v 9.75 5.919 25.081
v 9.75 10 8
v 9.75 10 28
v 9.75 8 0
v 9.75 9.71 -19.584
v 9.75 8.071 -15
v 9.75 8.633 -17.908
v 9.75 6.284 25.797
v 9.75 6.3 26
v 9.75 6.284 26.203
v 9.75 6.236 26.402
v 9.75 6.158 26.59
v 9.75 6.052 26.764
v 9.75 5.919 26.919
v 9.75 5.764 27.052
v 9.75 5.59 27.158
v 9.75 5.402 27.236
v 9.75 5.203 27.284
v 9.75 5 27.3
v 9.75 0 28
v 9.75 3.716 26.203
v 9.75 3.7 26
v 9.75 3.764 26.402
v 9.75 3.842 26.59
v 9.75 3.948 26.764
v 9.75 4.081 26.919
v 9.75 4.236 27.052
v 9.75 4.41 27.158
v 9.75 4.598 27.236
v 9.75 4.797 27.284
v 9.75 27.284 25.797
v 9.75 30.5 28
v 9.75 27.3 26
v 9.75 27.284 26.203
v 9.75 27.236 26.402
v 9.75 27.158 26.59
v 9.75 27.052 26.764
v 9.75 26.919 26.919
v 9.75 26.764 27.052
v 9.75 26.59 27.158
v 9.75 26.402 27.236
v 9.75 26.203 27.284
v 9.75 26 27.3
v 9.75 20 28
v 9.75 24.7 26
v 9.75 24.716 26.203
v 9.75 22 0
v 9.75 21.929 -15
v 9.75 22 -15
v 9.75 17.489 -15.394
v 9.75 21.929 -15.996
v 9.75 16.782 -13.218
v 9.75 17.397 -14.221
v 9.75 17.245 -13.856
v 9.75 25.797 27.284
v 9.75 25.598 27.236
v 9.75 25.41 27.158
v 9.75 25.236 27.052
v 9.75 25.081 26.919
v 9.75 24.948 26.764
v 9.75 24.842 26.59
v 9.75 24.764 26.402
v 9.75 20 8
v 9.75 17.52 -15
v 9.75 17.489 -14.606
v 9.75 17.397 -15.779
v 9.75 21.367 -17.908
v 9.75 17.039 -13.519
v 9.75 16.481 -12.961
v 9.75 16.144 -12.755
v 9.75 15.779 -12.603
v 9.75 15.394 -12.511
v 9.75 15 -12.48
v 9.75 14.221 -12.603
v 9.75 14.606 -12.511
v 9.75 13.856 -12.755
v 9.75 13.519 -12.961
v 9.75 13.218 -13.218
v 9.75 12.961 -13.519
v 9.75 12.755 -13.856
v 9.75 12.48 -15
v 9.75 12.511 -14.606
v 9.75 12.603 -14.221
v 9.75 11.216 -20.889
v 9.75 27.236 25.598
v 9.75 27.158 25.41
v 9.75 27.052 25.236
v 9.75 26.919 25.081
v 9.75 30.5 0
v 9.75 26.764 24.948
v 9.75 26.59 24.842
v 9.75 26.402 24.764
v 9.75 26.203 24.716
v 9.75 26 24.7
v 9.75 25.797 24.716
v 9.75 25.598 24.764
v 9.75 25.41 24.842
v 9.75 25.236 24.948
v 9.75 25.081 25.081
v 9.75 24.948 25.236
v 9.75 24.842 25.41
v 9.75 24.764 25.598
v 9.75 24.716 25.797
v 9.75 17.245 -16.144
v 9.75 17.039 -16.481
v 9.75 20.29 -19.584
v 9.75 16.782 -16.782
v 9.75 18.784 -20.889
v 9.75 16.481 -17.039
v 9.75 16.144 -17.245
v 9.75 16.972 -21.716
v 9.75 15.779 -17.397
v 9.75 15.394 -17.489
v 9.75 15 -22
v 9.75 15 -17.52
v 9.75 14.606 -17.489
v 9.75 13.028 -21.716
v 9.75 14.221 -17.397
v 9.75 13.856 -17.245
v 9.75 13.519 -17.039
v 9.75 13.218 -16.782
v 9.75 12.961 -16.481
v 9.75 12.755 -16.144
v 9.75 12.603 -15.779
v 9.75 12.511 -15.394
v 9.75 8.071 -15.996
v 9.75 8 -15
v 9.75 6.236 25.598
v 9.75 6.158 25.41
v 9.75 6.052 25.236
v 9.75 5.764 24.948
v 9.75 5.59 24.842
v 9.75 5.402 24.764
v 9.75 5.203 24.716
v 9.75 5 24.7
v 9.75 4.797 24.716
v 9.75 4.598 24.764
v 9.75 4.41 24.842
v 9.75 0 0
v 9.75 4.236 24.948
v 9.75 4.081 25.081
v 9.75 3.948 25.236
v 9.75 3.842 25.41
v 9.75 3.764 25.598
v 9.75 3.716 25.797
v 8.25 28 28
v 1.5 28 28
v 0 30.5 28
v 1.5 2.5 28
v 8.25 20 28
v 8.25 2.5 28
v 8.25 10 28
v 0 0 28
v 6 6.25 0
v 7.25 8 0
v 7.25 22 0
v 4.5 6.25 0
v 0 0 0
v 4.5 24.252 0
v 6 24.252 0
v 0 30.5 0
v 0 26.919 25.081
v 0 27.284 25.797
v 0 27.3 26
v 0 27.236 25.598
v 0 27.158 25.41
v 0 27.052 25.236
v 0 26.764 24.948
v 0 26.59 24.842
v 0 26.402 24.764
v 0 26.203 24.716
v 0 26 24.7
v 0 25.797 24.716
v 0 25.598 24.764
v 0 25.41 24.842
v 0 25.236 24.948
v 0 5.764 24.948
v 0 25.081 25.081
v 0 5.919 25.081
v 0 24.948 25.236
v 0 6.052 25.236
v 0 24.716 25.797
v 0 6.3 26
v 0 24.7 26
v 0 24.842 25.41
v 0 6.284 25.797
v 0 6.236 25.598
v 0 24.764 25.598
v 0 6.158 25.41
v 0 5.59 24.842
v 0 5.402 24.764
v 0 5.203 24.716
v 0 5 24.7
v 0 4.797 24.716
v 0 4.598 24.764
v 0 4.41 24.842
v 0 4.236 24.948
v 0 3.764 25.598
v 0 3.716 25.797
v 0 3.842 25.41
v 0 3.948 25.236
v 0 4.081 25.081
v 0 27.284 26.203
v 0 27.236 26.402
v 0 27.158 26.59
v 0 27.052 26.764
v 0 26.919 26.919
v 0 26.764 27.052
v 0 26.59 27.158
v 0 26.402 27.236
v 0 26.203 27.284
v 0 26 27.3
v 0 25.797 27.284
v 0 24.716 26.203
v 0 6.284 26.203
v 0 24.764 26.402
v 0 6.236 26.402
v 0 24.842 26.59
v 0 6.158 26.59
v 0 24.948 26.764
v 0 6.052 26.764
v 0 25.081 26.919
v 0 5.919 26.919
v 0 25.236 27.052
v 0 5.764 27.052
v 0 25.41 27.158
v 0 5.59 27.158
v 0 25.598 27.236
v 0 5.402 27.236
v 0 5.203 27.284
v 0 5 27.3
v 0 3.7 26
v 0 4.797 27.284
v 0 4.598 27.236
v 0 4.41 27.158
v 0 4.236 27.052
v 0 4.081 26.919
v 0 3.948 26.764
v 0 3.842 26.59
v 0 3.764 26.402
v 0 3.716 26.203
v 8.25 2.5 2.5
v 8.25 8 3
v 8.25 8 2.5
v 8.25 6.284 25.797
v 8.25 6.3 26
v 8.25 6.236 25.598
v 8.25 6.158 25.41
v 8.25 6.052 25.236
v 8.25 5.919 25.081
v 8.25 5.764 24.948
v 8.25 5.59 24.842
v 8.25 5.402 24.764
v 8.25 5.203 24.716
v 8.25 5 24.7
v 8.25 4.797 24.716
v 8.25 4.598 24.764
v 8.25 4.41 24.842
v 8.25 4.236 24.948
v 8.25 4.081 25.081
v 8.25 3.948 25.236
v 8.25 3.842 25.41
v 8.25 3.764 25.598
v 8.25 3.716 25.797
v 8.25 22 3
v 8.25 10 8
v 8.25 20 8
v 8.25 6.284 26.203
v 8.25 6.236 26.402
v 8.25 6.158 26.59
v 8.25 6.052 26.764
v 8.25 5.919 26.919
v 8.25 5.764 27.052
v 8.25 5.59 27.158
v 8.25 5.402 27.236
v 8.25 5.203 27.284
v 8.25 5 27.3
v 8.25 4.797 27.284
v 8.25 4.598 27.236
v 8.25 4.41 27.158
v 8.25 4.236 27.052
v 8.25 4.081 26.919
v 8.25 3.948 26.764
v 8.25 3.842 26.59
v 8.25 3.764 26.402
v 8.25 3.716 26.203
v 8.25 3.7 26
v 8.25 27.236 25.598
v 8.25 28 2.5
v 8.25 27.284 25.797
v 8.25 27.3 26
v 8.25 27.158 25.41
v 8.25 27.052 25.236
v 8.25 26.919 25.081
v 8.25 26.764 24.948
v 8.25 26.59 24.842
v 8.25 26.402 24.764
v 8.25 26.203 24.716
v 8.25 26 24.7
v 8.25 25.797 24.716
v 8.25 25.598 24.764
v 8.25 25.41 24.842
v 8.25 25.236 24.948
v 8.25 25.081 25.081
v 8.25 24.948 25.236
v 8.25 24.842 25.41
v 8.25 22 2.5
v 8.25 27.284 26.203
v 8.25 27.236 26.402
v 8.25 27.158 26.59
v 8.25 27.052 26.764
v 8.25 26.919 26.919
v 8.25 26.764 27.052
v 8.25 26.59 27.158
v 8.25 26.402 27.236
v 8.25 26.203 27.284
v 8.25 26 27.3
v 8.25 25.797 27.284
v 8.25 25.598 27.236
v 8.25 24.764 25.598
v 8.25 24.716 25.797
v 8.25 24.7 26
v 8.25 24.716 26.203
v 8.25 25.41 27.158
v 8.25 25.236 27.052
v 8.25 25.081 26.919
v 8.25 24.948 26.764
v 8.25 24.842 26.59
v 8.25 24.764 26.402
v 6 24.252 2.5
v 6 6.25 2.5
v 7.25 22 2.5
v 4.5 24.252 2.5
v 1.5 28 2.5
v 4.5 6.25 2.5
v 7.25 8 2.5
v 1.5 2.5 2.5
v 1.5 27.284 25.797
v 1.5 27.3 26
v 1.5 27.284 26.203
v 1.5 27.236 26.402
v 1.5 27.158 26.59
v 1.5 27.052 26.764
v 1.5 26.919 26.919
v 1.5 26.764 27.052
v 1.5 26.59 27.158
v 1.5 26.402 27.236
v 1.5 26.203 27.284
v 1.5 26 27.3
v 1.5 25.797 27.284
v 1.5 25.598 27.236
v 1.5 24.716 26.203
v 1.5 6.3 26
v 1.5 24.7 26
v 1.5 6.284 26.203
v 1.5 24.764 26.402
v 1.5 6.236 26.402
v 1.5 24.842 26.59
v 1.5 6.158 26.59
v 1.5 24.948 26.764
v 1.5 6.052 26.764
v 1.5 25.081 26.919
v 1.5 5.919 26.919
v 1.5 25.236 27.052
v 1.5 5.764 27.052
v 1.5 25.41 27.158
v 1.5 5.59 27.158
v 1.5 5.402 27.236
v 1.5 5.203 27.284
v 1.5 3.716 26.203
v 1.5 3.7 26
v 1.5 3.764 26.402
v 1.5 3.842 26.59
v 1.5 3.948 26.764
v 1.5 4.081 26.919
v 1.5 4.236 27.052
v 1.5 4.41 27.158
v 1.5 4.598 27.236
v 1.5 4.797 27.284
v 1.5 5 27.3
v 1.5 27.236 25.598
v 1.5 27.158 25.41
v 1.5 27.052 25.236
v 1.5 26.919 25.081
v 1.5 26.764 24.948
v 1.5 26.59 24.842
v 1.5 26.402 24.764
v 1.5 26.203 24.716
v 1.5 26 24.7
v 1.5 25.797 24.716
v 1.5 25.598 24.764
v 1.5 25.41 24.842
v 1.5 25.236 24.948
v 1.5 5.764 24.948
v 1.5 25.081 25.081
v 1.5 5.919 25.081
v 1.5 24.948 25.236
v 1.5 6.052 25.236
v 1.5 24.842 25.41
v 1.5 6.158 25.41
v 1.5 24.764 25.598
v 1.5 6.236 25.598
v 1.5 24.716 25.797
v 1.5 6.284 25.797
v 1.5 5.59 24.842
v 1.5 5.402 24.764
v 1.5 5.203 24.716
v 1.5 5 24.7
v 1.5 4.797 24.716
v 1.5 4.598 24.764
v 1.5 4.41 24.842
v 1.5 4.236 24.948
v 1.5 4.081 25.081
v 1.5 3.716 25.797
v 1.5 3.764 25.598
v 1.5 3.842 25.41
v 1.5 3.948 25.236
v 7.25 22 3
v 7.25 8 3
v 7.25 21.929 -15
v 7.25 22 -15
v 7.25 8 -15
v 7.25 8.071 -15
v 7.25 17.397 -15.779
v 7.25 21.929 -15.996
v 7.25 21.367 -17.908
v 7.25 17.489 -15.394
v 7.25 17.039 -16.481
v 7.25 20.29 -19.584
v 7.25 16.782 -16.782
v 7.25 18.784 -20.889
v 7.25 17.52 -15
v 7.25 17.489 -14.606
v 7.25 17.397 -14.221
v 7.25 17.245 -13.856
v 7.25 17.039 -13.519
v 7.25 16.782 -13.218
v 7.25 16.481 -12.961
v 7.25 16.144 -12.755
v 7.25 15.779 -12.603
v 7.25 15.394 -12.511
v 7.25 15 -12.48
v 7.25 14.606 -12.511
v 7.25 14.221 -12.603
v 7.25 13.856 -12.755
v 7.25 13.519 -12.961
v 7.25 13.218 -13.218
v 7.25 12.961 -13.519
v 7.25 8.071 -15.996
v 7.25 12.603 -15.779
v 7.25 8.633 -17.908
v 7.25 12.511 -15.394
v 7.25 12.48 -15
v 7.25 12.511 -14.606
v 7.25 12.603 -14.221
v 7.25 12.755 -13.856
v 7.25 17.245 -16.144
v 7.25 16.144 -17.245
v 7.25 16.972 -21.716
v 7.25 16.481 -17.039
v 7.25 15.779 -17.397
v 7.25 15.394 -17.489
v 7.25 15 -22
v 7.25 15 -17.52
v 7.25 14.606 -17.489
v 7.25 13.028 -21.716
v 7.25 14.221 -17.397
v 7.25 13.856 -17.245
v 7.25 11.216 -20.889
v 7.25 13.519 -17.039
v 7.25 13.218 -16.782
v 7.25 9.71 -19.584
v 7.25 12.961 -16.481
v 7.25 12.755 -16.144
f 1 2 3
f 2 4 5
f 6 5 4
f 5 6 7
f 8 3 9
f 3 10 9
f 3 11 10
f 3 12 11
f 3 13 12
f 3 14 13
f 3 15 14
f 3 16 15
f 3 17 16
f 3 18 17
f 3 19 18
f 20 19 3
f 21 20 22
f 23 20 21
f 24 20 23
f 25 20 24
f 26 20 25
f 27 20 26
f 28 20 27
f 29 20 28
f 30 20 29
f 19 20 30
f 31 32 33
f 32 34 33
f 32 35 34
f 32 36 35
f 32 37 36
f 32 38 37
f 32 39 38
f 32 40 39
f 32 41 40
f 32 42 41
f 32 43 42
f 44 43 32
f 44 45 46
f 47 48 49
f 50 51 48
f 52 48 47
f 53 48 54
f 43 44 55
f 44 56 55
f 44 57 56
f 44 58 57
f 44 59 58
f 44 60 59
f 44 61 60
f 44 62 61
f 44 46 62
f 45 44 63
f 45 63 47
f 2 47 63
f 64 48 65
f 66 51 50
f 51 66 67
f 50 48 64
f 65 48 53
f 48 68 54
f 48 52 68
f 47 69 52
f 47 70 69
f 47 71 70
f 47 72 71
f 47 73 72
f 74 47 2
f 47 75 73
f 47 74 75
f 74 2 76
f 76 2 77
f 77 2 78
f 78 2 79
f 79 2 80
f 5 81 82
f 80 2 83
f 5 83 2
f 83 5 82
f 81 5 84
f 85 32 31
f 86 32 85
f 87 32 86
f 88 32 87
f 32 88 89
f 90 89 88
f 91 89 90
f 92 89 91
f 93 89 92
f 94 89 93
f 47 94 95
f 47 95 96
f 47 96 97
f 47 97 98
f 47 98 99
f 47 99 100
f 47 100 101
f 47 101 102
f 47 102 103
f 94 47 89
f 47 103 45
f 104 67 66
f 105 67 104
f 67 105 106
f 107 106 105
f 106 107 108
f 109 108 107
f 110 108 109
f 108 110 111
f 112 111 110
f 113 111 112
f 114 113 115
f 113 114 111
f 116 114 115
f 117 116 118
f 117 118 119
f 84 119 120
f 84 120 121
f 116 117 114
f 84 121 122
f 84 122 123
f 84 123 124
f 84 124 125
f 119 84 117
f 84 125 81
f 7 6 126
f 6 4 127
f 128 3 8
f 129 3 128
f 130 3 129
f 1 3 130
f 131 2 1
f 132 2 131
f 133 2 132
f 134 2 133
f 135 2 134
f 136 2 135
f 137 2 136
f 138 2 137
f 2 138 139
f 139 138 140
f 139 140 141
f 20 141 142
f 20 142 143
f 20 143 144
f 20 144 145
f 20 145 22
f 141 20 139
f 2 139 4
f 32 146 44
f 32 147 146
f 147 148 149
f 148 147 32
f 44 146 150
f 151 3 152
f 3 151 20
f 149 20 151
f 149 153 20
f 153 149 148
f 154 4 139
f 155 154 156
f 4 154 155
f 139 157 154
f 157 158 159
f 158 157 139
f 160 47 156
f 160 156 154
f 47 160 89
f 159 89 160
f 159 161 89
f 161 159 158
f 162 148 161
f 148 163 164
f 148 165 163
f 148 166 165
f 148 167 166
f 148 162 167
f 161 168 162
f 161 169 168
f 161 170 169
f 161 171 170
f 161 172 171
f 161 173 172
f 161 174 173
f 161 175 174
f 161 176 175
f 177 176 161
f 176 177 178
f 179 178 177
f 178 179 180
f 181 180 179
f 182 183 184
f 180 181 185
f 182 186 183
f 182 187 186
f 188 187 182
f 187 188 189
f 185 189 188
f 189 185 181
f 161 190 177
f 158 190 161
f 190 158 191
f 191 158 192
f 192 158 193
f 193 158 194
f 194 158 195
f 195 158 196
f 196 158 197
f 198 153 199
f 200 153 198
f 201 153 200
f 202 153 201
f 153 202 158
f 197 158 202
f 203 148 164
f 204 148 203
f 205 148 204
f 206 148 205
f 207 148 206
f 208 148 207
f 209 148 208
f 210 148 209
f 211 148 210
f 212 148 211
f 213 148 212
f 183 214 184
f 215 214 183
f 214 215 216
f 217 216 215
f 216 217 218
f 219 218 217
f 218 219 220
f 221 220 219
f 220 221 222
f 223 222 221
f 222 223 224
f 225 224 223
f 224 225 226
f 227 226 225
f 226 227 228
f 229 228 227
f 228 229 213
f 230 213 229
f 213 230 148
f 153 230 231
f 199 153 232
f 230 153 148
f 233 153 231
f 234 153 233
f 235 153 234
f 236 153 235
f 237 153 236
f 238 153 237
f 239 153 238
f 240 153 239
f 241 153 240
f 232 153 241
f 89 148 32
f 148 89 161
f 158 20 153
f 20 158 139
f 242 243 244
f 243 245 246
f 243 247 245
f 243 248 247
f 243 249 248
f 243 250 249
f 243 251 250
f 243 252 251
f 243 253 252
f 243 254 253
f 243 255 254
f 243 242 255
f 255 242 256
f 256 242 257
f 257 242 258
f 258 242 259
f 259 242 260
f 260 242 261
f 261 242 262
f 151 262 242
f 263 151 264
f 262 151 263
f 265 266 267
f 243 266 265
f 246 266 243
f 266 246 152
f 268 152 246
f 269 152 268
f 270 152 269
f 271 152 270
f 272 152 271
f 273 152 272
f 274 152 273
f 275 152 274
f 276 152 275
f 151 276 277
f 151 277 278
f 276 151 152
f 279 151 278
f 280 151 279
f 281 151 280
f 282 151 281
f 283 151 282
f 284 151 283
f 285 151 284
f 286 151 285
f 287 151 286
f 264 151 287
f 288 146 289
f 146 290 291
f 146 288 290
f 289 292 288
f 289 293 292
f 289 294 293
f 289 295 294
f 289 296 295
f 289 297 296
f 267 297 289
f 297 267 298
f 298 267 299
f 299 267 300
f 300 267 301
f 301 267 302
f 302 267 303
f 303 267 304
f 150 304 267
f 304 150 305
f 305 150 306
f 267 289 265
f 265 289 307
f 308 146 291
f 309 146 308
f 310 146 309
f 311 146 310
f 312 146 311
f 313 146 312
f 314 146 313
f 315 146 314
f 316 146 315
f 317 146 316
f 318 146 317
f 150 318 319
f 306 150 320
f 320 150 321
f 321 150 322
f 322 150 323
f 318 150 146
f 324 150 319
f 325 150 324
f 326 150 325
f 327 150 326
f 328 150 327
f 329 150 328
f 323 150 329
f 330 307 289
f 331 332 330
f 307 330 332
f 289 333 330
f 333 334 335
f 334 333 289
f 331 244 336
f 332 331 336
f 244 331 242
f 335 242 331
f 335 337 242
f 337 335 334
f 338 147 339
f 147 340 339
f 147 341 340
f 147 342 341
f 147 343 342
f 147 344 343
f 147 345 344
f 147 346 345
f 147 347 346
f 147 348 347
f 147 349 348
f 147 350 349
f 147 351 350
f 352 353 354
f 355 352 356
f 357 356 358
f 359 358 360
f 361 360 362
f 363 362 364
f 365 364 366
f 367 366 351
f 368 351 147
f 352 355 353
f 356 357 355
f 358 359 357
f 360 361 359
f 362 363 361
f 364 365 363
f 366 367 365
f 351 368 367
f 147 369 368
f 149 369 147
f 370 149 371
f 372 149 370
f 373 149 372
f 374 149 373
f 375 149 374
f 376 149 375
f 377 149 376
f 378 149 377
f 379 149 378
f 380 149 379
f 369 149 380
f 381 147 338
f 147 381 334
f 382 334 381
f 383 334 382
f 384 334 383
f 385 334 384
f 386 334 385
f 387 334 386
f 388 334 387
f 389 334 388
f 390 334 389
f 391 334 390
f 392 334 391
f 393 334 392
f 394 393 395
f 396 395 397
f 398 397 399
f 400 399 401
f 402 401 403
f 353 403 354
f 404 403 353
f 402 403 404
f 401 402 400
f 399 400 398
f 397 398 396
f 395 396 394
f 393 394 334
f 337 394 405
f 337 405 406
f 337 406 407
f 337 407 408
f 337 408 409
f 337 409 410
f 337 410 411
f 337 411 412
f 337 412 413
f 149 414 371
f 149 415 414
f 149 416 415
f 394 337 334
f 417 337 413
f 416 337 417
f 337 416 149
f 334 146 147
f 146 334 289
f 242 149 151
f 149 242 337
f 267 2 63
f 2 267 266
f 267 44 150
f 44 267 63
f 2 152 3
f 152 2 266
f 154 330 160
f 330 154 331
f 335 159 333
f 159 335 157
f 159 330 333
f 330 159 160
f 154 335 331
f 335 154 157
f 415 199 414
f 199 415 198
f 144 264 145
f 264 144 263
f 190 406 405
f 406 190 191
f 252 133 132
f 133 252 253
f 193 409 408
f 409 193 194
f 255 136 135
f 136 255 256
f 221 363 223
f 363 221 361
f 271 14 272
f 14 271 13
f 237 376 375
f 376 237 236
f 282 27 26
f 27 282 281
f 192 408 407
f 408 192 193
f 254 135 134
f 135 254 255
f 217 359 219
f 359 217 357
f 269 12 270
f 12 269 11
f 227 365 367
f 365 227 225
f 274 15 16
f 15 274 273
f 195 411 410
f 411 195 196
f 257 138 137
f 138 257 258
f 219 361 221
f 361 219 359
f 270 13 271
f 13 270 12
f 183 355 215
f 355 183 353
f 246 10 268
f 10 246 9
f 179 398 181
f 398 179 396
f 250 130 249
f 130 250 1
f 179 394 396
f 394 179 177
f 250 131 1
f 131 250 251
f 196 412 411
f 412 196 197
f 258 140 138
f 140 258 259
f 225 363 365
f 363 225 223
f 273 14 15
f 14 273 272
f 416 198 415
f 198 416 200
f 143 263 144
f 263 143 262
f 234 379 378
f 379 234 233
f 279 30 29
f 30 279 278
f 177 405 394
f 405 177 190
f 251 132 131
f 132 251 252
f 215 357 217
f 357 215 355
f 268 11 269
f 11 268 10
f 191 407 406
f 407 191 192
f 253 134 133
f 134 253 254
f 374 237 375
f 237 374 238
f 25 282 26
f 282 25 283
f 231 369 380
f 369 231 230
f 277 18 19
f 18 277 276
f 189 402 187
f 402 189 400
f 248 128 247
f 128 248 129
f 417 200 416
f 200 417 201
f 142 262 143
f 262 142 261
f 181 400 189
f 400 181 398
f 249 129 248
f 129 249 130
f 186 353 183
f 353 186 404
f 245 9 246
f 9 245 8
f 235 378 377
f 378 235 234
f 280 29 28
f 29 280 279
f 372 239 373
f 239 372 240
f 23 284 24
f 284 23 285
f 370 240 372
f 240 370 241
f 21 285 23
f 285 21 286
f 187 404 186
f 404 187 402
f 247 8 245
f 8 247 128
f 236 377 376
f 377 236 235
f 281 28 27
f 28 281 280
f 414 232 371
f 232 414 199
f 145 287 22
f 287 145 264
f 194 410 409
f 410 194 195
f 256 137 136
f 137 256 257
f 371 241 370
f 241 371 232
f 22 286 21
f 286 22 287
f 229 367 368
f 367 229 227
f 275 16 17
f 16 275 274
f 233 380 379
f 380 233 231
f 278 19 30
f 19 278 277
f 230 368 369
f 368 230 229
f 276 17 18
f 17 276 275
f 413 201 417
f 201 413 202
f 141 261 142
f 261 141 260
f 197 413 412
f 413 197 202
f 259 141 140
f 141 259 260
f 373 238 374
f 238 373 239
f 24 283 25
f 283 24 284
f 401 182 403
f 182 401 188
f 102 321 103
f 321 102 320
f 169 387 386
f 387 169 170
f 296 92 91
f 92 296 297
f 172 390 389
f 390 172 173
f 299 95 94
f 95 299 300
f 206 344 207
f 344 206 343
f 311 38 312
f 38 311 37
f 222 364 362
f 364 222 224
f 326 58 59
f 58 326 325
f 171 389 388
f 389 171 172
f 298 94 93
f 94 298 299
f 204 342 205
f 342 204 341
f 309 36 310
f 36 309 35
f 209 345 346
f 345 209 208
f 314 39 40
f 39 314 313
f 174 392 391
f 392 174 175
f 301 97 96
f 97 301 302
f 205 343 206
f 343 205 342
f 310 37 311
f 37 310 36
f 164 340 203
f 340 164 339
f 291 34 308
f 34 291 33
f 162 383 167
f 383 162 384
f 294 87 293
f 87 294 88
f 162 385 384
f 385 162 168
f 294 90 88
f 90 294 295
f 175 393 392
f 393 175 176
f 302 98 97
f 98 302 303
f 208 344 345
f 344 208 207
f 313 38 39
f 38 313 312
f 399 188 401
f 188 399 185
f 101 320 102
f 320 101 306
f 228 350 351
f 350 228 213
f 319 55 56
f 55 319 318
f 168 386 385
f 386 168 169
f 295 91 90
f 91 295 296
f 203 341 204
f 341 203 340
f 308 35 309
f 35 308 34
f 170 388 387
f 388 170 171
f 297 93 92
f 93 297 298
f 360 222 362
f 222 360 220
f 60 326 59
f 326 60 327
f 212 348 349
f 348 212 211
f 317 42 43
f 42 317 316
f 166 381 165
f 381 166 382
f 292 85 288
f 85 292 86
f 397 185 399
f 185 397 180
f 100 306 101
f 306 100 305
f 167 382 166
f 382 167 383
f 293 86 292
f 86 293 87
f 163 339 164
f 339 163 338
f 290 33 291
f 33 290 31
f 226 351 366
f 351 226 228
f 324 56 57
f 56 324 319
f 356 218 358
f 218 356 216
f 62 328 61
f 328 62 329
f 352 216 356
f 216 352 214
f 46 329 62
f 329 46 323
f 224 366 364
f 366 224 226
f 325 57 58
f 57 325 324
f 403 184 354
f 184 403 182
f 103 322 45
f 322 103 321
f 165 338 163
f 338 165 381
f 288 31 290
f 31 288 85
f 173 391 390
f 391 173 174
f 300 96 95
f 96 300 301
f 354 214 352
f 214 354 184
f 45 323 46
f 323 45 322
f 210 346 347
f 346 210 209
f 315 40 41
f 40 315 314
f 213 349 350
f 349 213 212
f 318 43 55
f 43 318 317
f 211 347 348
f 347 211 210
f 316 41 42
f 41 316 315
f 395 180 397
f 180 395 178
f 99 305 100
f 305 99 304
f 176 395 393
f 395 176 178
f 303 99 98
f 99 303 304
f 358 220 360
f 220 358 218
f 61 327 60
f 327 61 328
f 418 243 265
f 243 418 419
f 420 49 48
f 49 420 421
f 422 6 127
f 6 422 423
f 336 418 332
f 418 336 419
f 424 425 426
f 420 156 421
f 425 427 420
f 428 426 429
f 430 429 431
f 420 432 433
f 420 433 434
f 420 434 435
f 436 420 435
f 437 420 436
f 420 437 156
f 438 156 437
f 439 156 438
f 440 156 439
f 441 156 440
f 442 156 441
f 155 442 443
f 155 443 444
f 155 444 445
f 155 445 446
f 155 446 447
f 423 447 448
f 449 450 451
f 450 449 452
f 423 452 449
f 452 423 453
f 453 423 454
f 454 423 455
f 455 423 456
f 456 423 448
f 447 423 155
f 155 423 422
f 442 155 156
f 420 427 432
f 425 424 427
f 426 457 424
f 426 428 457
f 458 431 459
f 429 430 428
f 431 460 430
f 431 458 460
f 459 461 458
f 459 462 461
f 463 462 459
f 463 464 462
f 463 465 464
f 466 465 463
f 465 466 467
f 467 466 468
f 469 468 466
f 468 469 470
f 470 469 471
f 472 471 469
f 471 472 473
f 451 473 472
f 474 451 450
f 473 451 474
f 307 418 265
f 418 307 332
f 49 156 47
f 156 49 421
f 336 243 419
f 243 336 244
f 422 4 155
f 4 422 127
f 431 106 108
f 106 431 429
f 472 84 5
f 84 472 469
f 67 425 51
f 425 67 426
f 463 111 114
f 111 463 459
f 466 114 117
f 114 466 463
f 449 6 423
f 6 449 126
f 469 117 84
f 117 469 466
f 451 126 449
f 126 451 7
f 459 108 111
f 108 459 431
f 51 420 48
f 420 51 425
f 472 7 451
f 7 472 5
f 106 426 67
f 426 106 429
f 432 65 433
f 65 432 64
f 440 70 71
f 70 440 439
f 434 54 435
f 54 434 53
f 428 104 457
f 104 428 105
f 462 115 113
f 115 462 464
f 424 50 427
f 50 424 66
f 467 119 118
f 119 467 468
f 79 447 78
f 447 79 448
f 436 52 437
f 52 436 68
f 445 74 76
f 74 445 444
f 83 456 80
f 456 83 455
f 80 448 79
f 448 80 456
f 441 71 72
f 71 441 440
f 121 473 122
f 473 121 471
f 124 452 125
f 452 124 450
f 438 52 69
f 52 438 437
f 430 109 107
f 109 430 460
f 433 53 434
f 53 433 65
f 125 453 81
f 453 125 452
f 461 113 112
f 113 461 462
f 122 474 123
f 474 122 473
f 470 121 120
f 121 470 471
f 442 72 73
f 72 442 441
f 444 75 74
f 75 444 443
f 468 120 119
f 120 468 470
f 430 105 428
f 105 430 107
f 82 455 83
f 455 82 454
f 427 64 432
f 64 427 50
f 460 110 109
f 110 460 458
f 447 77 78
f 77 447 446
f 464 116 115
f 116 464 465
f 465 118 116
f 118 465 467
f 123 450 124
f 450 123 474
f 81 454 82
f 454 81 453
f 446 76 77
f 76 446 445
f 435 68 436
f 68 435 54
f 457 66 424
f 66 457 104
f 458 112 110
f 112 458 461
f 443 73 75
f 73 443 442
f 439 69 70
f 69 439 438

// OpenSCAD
// original design by devzero, published Oct 19, 2013
// https://www.thingiverse.com/thing:168581
// modified by Hao Chen Oct 11 2017

board_width=25.5;
board_height=23;
board_thick=4.75;
cable_width=18;
cable_thick=1.5;
side_cover=7.5;
camera_hole_width=10;
camera_hole_height=5.5;
screw_hole_r=2.65;
padding=2.5;
d=0.001;
mount_offset=2*padding+board_width;
mount_thickness=8;


//camera holder
difference(){
	cube([board_thick+2*padding, board_width+2*padding, board_height+2*padding]);
	//main compartment
	translate([padding-1, padding, padding]) cube([board_thick+2, board_width, board_height+padding+d]);
	//front camera slot
	translate([board_thick+padding-d, padding+side_cover, padding+camera_hole_height]) cube([padding+2*d, camera_hole_width, board_height+padding-camera_hole_height+d]);
	//hole for cable in the bottom
	translate([padding+2,padding+(board_width-cable_width)/2,0]) cube([cable_thick, cable_width+2*d, padding+2*d]);
	// screw holds
	translate([0,5,board_height+3]) rotate([0,90,0]) cylinder(r=1.3, h=20,$fn=40);
	translate([0,26,board_height+3]) rotate([0,90,0]) cylinder(r=1.3, h=20,$fn=40);
}

//handle
	
difference(){
	union(){
		translate([7.25,8,-15])cube([2.5,14, 18]);
		translate([7.25,8+7,-15])rotate([0,90,0]) cylinder(r=7,h=2.5);
	}
	translate([-5,15,-15])rotate([0,90,0])cylinder(r=2.52, h=20, $fn=40);
}
